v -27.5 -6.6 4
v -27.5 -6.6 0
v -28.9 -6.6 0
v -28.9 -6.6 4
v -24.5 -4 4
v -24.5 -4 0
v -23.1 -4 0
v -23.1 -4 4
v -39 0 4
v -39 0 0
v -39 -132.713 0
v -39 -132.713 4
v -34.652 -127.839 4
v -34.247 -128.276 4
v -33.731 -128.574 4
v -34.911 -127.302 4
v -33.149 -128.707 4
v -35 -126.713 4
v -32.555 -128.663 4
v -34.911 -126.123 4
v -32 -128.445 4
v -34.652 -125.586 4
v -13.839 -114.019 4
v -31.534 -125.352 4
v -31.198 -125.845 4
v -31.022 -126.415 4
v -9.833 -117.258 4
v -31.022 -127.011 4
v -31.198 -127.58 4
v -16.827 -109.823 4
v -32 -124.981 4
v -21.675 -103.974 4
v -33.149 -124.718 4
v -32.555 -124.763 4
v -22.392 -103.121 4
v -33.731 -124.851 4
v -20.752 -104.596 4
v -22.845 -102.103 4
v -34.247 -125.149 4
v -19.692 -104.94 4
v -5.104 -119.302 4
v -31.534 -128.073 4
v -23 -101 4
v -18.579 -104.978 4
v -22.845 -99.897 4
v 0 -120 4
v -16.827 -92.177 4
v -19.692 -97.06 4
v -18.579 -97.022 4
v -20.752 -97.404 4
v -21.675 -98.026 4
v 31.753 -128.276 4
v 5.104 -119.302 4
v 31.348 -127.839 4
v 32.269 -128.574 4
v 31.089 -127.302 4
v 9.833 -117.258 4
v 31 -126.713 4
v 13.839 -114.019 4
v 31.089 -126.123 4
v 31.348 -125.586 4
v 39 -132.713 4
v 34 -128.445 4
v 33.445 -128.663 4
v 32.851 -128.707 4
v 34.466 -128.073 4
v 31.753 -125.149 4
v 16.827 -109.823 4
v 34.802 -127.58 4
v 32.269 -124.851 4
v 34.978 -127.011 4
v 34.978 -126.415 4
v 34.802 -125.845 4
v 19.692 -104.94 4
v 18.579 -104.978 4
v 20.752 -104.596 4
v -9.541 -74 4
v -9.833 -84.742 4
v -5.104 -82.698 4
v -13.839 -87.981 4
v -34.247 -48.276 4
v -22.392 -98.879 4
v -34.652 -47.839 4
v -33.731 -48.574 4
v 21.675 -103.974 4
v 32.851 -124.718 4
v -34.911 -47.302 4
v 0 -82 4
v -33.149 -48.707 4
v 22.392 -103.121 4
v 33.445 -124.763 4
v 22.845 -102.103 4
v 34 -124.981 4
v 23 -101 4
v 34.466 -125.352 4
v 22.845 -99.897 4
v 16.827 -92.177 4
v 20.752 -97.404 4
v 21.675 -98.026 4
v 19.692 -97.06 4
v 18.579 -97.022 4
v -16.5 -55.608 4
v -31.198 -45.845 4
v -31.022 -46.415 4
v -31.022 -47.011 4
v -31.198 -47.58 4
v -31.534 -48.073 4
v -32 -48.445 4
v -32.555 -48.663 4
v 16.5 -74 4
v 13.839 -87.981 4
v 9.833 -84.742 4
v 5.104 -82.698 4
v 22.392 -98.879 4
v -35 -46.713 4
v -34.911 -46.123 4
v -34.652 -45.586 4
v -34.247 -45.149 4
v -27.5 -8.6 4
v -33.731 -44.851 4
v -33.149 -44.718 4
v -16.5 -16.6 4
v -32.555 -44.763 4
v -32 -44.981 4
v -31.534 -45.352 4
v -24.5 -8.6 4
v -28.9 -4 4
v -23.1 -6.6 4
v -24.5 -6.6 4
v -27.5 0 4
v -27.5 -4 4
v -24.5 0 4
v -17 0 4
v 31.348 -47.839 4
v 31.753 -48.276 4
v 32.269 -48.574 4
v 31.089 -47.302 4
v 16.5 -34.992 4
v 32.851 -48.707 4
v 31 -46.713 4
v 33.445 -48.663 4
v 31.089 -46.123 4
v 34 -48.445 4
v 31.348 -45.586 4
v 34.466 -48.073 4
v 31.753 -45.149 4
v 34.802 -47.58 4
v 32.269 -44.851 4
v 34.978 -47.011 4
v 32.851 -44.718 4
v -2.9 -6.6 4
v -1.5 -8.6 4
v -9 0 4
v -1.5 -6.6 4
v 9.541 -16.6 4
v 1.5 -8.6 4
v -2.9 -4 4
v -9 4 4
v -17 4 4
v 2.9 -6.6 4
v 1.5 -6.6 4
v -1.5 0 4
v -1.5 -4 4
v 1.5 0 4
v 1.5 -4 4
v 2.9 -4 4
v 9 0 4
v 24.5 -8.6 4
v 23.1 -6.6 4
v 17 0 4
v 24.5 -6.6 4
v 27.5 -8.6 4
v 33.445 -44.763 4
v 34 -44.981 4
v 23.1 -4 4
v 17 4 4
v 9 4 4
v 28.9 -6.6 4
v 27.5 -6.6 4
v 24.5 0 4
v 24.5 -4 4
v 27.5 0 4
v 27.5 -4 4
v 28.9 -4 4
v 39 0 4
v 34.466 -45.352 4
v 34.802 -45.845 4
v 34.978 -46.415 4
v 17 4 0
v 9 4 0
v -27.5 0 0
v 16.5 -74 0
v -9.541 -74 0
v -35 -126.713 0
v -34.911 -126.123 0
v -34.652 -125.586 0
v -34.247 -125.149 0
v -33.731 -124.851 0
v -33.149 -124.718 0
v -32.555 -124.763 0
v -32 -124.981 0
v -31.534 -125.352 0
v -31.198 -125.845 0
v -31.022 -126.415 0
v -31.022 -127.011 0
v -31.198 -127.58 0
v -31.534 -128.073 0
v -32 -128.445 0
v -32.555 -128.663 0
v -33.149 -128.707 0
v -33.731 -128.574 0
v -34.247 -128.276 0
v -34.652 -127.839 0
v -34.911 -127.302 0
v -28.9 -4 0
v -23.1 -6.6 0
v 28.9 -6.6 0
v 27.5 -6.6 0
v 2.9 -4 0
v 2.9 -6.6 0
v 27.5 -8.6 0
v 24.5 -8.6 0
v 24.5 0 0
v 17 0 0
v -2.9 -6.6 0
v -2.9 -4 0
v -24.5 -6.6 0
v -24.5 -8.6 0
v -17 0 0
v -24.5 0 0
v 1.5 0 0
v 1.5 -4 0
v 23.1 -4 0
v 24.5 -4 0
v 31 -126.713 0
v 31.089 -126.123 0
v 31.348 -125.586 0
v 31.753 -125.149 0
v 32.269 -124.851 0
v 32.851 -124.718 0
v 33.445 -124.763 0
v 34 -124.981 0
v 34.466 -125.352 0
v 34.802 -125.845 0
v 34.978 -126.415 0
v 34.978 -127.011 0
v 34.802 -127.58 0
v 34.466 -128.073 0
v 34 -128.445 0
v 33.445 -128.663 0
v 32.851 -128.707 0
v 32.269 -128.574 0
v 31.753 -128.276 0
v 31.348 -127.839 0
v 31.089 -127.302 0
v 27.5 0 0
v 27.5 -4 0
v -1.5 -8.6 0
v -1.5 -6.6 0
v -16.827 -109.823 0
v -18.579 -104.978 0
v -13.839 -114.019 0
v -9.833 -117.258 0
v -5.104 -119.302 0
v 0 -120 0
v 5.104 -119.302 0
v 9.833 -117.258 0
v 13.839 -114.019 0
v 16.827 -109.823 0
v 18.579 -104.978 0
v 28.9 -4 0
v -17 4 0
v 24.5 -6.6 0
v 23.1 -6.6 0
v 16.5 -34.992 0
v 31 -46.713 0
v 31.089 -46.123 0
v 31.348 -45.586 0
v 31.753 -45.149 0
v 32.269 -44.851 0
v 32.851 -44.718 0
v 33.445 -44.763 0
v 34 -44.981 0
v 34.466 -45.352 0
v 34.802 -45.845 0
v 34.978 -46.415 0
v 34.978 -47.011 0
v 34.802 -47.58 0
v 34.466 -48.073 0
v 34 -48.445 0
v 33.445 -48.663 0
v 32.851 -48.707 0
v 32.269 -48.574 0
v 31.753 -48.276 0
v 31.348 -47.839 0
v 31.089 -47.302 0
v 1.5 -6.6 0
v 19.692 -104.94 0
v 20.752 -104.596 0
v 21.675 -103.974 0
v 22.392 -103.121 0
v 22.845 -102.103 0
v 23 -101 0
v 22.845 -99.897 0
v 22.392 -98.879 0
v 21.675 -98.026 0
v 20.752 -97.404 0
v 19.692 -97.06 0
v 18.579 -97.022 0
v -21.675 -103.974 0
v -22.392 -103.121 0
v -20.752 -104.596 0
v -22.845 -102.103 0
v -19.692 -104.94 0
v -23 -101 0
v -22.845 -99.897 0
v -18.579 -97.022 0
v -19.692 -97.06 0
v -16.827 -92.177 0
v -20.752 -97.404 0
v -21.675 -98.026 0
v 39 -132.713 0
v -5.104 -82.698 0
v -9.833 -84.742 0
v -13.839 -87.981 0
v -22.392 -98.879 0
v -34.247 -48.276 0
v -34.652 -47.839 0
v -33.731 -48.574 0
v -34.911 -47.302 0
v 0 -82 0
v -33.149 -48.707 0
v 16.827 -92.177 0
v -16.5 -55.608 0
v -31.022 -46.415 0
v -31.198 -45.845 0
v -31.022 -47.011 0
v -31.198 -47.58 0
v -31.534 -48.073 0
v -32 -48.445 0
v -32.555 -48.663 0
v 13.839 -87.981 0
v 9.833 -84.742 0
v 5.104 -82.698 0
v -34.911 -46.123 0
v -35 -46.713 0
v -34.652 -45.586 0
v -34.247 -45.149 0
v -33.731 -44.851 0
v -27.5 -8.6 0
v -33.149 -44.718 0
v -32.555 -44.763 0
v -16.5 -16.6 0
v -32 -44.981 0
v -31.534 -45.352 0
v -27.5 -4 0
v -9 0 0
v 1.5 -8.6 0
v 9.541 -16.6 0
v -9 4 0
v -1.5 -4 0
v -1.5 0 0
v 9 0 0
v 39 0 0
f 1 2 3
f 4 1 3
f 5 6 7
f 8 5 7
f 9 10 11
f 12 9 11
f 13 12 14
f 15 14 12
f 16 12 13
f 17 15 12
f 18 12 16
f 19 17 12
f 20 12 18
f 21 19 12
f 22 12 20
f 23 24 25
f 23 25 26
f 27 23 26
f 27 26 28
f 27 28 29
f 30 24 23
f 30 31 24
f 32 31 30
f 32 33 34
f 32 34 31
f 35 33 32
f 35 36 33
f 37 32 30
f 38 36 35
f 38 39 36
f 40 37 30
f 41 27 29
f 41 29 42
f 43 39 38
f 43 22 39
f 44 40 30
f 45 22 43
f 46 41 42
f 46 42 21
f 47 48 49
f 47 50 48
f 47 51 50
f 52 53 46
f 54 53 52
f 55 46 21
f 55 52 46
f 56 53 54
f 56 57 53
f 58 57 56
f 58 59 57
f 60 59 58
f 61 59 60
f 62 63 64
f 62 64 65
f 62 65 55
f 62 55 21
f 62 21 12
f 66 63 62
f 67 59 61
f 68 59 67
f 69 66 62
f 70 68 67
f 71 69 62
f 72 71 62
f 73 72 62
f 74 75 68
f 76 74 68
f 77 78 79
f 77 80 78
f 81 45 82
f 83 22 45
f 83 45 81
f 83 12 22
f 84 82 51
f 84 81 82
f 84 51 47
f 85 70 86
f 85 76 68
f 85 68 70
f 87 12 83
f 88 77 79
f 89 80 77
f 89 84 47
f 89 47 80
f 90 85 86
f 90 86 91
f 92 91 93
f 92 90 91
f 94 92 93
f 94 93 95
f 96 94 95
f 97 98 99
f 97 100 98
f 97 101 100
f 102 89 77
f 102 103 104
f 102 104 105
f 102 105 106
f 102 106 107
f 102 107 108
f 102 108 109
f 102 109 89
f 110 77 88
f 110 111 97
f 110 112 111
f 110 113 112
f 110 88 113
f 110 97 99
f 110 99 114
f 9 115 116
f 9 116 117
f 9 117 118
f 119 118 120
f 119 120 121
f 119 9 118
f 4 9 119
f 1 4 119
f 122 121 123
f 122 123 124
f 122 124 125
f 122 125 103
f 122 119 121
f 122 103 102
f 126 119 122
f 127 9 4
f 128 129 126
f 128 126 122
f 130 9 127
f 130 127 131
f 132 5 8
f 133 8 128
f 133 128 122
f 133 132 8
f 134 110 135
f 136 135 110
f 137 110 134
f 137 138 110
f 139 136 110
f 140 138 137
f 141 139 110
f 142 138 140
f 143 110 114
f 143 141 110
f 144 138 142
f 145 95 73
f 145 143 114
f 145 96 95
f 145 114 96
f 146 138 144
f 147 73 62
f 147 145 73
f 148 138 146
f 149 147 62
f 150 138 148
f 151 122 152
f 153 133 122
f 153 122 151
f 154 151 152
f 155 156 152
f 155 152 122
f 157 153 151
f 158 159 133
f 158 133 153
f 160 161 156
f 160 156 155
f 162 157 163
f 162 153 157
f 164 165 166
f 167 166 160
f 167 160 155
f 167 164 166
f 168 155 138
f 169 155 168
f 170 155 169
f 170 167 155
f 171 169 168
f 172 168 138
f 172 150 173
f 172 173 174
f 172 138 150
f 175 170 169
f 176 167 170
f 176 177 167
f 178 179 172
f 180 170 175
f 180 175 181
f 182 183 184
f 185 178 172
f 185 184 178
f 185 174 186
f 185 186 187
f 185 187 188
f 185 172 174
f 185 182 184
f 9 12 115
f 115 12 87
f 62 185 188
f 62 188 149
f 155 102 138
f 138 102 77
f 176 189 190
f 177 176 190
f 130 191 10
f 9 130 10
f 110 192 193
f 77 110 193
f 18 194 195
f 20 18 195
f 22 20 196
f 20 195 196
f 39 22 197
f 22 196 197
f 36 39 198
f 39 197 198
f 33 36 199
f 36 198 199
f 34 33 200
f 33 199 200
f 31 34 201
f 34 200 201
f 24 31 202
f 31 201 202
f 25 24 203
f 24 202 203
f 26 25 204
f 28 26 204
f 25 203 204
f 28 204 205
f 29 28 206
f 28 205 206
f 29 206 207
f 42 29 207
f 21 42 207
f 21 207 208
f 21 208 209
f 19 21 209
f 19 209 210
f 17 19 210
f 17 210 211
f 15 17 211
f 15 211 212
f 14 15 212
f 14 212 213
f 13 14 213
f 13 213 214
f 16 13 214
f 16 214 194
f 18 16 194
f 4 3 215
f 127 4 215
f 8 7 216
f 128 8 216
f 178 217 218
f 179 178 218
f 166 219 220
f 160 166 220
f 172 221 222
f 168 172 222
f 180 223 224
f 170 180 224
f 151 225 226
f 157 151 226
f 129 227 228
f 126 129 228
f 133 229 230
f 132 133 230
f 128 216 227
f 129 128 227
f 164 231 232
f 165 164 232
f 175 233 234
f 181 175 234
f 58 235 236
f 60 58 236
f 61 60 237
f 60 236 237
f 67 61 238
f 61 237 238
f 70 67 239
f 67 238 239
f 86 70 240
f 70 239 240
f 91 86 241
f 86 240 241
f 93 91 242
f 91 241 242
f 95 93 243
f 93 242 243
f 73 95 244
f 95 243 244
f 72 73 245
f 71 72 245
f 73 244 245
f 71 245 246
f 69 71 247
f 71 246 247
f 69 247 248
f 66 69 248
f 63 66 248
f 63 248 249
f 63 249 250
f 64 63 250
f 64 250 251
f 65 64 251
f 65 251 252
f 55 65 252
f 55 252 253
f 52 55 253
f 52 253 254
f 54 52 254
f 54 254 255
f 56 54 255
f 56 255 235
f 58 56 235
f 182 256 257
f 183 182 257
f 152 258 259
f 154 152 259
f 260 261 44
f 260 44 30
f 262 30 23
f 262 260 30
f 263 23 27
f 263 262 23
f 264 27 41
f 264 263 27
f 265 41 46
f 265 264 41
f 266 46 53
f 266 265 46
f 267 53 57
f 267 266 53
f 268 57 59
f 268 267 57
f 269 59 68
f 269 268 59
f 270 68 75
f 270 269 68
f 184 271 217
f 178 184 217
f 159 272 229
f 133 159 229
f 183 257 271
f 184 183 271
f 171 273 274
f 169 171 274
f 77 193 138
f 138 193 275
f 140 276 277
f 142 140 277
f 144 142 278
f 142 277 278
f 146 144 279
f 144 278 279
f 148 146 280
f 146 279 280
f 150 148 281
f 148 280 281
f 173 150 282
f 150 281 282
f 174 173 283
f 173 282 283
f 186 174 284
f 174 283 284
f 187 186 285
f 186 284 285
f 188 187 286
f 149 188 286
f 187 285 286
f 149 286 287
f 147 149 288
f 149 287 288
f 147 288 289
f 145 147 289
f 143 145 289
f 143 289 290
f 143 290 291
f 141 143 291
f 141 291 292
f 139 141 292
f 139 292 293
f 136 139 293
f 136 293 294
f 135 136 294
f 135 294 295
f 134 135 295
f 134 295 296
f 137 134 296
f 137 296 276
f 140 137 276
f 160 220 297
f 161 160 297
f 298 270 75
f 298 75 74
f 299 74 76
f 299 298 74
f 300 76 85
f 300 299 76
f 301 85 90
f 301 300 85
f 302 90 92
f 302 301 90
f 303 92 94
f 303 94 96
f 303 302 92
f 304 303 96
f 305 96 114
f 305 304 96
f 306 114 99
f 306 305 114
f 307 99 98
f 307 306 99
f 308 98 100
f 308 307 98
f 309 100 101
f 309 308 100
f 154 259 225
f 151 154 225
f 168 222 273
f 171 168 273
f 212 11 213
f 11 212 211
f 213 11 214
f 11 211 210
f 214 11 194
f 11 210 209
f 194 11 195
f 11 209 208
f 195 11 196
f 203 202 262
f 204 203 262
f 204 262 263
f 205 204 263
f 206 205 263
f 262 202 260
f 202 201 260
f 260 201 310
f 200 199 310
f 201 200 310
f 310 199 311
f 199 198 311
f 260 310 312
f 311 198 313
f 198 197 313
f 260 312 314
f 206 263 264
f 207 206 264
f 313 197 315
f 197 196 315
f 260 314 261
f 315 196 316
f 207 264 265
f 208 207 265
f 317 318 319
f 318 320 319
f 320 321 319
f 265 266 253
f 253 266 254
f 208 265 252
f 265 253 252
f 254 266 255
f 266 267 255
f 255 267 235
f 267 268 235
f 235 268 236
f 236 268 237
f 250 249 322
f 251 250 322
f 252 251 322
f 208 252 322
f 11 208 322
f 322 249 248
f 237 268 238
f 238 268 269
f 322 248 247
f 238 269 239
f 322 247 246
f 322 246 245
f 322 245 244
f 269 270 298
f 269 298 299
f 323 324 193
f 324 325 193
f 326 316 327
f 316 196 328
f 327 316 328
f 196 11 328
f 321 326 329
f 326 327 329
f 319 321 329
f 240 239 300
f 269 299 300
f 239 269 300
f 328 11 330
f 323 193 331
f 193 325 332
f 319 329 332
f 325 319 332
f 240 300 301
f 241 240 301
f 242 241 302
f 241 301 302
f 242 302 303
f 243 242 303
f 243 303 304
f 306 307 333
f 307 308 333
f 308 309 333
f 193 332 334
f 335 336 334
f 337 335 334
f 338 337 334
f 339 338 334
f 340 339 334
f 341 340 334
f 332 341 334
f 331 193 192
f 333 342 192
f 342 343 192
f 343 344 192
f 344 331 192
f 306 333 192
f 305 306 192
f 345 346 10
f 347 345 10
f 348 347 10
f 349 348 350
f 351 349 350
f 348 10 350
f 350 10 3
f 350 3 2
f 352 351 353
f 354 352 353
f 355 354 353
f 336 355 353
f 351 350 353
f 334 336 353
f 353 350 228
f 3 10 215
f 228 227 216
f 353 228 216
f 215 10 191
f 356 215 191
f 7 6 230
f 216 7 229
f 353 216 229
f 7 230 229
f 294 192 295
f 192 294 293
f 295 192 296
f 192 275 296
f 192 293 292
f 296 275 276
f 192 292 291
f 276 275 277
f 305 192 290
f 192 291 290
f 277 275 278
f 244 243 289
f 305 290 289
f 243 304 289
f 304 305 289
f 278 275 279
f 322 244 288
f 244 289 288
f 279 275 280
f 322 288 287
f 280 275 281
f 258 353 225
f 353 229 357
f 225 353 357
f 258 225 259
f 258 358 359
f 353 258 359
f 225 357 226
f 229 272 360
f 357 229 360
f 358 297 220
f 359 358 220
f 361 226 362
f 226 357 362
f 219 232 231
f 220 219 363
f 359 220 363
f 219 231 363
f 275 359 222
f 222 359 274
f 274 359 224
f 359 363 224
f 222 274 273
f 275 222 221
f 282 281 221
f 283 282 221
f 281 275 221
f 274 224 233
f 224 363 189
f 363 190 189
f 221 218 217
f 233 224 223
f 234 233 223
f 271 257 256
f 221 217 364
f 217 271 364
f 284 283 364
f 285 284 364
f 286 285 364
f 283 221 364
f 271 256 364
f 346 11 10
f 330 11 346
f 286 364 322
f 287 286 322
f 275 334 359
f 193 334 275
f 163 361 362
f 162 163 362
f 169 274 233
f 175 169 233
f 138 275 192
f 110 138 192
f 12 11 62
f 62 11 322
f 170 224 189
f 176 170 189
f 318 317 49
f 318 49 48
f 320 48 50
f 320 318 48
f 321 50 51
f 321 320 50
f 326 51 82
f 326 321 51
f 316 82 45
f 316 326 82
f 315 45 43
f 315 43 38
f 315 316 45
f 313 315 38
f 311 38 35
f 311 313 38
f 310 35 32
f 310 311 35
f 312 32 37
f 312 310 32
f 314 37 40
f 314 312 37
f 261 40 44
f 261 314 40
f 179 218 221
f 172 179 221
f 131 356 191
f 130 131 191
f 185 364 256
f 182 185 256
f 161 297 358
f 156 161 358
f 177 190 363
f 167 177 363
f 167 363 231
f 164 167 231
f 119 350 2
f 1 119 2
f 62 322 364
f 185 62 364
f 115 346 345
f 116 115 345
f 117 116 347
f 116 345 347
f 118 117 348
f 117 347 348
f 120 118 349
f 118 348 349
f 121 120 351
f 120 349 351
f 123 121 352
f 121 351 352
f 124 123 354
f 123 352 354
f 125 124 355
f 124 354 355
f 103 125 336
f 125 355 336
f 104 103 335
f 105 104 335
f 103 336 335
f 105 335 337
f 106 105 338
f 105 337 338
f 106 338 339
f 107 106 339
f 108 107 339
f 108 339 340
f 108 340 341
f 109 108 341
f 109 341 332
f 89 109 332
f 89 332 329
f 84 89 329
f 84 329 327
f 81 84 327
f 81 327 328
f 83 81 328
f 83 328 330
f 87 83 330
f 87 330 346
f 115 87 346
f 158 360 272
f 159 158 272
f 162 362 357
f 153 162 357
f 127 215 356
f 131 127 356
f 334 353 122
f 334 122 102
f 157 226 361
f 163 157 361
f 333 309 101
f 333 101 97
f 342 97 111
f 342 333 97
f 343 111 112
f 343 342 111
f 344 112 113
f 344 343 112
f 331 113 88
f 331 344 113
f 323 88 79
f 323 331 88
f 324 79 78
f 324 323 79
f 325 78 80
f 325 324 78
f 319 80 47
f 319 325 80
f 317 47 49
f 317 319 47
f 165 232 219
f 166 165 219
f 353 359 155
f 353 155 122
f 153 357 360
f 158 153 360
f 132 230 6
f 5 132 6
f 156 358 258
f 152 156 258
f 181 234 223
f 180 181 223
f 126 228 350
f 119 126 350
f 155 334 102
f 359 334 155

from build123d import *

# Parameters (mm, degrees)
EXTRUDE_1_DEPTH     = 4
SKETCH_3_R          = 2
CUT_EXTRUDE_1_DEPTH = 10
CUT_EXTRUDE_2_DEPTH = 10


with BuildPart() as part:
    # 草图1 → 凸台-拉伸1 (new body)
    with BuildSketch(Plane.XY):
        Polygon((1.5, 0), (1.5, -4), (2.9, -4), (2.9, -6.6), (1.5, -6.6), (1.5, -8.6), (-1.5, -8.6), (-1.5, -6.6), (-2.9, -6.6), (-2.9, -4), (-1.5, -4), (-1.5, 0), (-9, 0), (-9, 4), (-17, 4), (-17, 0), (-24.5, 0), (-24.5, -4), (-23.1, -4), (-23.1, -6.6), (-24.5, -6.6), (-24.5, -8.6), (-27.5, -8.6), (-27.5, -6.6), (-28.9, -6.6), (-28.9, -4), (-27.5, -4), (-27.5, 0), (-39, 0), (-39, -132.712721559), (39, -132.712721559), (39, 0), (27.5, 0), (27.5, -4), (28.9, -4), (28.9, -6.6), (27.5, -6.6), (27.5, -8.6), (24.5, -8.6), (24.5, -6.6), (23.1, -6.6), (23.1, -4), (24.5, -4), (24.5, 0), (17, 0), (17, 4), (9, 4), (9, 0), align=None)
        with BuildLine():
            ThreePointArc((18.578947368, -97.022222394), (0, -82), (-18.578947368, -97.022222394))
            ThreePointArc((-18.578947368, -97.022222394), (-23, -101), (-18.578947368, -104.977777606))
            ThreePointArc((-18.578947368, -104.977777606), (0, -120), (18.578947368, -104.977777606))
            ThreePointArc((18.578947368, -104.977777606), (23, -101), (18.578947368, -97.022222394))
        make_face(mode=Mode.SUBTRACT)
    extrude(amount=EXTRUDE_1_DEPTH)

    # 草图3 → 切除-拉伸1 (cut)
    with BuildSketch(Plane(origin=(0, 0, 0), x_dir=(-1, 0, 0), z_dir=(0, 0, -1))):
        with Locations((33, -126.712721559)):
            Circle(SKETCH_3_R)
        with Locations((33, -46.712721559)):
            Circle(SKETCH_3_R)
        with Locations((-33, -46.712721559)):
            Circle(SKETCH_3_R)
        with Locations((-33, -126.712721559)):
            Circle(SKETCH_3_R)
    extrude(amount=-CUT_EXTRUDE_1_DEPTH, mode=Mode.SUBTRACT)

    # 草图4 → 切除-拉伸2 (cut)
    with BuildSketch(Plane(origin=(0, 0, 0), x_dir=(-1, 0, 0), z_dir=(0, 0, -1))):
        Polygon((16.5, -16.6), (16.5, -55.607703077), (-9.540564725, -16.6), align=None)
        Polygon((9.540564725, -74), (-16.5, -34.992296923), (-16.5, -74), align=None)
    extrude(amount=-CUT_EXTRUDE_2_DEPTH, mode=Mode.SUBTRACT)


solid = part.part
